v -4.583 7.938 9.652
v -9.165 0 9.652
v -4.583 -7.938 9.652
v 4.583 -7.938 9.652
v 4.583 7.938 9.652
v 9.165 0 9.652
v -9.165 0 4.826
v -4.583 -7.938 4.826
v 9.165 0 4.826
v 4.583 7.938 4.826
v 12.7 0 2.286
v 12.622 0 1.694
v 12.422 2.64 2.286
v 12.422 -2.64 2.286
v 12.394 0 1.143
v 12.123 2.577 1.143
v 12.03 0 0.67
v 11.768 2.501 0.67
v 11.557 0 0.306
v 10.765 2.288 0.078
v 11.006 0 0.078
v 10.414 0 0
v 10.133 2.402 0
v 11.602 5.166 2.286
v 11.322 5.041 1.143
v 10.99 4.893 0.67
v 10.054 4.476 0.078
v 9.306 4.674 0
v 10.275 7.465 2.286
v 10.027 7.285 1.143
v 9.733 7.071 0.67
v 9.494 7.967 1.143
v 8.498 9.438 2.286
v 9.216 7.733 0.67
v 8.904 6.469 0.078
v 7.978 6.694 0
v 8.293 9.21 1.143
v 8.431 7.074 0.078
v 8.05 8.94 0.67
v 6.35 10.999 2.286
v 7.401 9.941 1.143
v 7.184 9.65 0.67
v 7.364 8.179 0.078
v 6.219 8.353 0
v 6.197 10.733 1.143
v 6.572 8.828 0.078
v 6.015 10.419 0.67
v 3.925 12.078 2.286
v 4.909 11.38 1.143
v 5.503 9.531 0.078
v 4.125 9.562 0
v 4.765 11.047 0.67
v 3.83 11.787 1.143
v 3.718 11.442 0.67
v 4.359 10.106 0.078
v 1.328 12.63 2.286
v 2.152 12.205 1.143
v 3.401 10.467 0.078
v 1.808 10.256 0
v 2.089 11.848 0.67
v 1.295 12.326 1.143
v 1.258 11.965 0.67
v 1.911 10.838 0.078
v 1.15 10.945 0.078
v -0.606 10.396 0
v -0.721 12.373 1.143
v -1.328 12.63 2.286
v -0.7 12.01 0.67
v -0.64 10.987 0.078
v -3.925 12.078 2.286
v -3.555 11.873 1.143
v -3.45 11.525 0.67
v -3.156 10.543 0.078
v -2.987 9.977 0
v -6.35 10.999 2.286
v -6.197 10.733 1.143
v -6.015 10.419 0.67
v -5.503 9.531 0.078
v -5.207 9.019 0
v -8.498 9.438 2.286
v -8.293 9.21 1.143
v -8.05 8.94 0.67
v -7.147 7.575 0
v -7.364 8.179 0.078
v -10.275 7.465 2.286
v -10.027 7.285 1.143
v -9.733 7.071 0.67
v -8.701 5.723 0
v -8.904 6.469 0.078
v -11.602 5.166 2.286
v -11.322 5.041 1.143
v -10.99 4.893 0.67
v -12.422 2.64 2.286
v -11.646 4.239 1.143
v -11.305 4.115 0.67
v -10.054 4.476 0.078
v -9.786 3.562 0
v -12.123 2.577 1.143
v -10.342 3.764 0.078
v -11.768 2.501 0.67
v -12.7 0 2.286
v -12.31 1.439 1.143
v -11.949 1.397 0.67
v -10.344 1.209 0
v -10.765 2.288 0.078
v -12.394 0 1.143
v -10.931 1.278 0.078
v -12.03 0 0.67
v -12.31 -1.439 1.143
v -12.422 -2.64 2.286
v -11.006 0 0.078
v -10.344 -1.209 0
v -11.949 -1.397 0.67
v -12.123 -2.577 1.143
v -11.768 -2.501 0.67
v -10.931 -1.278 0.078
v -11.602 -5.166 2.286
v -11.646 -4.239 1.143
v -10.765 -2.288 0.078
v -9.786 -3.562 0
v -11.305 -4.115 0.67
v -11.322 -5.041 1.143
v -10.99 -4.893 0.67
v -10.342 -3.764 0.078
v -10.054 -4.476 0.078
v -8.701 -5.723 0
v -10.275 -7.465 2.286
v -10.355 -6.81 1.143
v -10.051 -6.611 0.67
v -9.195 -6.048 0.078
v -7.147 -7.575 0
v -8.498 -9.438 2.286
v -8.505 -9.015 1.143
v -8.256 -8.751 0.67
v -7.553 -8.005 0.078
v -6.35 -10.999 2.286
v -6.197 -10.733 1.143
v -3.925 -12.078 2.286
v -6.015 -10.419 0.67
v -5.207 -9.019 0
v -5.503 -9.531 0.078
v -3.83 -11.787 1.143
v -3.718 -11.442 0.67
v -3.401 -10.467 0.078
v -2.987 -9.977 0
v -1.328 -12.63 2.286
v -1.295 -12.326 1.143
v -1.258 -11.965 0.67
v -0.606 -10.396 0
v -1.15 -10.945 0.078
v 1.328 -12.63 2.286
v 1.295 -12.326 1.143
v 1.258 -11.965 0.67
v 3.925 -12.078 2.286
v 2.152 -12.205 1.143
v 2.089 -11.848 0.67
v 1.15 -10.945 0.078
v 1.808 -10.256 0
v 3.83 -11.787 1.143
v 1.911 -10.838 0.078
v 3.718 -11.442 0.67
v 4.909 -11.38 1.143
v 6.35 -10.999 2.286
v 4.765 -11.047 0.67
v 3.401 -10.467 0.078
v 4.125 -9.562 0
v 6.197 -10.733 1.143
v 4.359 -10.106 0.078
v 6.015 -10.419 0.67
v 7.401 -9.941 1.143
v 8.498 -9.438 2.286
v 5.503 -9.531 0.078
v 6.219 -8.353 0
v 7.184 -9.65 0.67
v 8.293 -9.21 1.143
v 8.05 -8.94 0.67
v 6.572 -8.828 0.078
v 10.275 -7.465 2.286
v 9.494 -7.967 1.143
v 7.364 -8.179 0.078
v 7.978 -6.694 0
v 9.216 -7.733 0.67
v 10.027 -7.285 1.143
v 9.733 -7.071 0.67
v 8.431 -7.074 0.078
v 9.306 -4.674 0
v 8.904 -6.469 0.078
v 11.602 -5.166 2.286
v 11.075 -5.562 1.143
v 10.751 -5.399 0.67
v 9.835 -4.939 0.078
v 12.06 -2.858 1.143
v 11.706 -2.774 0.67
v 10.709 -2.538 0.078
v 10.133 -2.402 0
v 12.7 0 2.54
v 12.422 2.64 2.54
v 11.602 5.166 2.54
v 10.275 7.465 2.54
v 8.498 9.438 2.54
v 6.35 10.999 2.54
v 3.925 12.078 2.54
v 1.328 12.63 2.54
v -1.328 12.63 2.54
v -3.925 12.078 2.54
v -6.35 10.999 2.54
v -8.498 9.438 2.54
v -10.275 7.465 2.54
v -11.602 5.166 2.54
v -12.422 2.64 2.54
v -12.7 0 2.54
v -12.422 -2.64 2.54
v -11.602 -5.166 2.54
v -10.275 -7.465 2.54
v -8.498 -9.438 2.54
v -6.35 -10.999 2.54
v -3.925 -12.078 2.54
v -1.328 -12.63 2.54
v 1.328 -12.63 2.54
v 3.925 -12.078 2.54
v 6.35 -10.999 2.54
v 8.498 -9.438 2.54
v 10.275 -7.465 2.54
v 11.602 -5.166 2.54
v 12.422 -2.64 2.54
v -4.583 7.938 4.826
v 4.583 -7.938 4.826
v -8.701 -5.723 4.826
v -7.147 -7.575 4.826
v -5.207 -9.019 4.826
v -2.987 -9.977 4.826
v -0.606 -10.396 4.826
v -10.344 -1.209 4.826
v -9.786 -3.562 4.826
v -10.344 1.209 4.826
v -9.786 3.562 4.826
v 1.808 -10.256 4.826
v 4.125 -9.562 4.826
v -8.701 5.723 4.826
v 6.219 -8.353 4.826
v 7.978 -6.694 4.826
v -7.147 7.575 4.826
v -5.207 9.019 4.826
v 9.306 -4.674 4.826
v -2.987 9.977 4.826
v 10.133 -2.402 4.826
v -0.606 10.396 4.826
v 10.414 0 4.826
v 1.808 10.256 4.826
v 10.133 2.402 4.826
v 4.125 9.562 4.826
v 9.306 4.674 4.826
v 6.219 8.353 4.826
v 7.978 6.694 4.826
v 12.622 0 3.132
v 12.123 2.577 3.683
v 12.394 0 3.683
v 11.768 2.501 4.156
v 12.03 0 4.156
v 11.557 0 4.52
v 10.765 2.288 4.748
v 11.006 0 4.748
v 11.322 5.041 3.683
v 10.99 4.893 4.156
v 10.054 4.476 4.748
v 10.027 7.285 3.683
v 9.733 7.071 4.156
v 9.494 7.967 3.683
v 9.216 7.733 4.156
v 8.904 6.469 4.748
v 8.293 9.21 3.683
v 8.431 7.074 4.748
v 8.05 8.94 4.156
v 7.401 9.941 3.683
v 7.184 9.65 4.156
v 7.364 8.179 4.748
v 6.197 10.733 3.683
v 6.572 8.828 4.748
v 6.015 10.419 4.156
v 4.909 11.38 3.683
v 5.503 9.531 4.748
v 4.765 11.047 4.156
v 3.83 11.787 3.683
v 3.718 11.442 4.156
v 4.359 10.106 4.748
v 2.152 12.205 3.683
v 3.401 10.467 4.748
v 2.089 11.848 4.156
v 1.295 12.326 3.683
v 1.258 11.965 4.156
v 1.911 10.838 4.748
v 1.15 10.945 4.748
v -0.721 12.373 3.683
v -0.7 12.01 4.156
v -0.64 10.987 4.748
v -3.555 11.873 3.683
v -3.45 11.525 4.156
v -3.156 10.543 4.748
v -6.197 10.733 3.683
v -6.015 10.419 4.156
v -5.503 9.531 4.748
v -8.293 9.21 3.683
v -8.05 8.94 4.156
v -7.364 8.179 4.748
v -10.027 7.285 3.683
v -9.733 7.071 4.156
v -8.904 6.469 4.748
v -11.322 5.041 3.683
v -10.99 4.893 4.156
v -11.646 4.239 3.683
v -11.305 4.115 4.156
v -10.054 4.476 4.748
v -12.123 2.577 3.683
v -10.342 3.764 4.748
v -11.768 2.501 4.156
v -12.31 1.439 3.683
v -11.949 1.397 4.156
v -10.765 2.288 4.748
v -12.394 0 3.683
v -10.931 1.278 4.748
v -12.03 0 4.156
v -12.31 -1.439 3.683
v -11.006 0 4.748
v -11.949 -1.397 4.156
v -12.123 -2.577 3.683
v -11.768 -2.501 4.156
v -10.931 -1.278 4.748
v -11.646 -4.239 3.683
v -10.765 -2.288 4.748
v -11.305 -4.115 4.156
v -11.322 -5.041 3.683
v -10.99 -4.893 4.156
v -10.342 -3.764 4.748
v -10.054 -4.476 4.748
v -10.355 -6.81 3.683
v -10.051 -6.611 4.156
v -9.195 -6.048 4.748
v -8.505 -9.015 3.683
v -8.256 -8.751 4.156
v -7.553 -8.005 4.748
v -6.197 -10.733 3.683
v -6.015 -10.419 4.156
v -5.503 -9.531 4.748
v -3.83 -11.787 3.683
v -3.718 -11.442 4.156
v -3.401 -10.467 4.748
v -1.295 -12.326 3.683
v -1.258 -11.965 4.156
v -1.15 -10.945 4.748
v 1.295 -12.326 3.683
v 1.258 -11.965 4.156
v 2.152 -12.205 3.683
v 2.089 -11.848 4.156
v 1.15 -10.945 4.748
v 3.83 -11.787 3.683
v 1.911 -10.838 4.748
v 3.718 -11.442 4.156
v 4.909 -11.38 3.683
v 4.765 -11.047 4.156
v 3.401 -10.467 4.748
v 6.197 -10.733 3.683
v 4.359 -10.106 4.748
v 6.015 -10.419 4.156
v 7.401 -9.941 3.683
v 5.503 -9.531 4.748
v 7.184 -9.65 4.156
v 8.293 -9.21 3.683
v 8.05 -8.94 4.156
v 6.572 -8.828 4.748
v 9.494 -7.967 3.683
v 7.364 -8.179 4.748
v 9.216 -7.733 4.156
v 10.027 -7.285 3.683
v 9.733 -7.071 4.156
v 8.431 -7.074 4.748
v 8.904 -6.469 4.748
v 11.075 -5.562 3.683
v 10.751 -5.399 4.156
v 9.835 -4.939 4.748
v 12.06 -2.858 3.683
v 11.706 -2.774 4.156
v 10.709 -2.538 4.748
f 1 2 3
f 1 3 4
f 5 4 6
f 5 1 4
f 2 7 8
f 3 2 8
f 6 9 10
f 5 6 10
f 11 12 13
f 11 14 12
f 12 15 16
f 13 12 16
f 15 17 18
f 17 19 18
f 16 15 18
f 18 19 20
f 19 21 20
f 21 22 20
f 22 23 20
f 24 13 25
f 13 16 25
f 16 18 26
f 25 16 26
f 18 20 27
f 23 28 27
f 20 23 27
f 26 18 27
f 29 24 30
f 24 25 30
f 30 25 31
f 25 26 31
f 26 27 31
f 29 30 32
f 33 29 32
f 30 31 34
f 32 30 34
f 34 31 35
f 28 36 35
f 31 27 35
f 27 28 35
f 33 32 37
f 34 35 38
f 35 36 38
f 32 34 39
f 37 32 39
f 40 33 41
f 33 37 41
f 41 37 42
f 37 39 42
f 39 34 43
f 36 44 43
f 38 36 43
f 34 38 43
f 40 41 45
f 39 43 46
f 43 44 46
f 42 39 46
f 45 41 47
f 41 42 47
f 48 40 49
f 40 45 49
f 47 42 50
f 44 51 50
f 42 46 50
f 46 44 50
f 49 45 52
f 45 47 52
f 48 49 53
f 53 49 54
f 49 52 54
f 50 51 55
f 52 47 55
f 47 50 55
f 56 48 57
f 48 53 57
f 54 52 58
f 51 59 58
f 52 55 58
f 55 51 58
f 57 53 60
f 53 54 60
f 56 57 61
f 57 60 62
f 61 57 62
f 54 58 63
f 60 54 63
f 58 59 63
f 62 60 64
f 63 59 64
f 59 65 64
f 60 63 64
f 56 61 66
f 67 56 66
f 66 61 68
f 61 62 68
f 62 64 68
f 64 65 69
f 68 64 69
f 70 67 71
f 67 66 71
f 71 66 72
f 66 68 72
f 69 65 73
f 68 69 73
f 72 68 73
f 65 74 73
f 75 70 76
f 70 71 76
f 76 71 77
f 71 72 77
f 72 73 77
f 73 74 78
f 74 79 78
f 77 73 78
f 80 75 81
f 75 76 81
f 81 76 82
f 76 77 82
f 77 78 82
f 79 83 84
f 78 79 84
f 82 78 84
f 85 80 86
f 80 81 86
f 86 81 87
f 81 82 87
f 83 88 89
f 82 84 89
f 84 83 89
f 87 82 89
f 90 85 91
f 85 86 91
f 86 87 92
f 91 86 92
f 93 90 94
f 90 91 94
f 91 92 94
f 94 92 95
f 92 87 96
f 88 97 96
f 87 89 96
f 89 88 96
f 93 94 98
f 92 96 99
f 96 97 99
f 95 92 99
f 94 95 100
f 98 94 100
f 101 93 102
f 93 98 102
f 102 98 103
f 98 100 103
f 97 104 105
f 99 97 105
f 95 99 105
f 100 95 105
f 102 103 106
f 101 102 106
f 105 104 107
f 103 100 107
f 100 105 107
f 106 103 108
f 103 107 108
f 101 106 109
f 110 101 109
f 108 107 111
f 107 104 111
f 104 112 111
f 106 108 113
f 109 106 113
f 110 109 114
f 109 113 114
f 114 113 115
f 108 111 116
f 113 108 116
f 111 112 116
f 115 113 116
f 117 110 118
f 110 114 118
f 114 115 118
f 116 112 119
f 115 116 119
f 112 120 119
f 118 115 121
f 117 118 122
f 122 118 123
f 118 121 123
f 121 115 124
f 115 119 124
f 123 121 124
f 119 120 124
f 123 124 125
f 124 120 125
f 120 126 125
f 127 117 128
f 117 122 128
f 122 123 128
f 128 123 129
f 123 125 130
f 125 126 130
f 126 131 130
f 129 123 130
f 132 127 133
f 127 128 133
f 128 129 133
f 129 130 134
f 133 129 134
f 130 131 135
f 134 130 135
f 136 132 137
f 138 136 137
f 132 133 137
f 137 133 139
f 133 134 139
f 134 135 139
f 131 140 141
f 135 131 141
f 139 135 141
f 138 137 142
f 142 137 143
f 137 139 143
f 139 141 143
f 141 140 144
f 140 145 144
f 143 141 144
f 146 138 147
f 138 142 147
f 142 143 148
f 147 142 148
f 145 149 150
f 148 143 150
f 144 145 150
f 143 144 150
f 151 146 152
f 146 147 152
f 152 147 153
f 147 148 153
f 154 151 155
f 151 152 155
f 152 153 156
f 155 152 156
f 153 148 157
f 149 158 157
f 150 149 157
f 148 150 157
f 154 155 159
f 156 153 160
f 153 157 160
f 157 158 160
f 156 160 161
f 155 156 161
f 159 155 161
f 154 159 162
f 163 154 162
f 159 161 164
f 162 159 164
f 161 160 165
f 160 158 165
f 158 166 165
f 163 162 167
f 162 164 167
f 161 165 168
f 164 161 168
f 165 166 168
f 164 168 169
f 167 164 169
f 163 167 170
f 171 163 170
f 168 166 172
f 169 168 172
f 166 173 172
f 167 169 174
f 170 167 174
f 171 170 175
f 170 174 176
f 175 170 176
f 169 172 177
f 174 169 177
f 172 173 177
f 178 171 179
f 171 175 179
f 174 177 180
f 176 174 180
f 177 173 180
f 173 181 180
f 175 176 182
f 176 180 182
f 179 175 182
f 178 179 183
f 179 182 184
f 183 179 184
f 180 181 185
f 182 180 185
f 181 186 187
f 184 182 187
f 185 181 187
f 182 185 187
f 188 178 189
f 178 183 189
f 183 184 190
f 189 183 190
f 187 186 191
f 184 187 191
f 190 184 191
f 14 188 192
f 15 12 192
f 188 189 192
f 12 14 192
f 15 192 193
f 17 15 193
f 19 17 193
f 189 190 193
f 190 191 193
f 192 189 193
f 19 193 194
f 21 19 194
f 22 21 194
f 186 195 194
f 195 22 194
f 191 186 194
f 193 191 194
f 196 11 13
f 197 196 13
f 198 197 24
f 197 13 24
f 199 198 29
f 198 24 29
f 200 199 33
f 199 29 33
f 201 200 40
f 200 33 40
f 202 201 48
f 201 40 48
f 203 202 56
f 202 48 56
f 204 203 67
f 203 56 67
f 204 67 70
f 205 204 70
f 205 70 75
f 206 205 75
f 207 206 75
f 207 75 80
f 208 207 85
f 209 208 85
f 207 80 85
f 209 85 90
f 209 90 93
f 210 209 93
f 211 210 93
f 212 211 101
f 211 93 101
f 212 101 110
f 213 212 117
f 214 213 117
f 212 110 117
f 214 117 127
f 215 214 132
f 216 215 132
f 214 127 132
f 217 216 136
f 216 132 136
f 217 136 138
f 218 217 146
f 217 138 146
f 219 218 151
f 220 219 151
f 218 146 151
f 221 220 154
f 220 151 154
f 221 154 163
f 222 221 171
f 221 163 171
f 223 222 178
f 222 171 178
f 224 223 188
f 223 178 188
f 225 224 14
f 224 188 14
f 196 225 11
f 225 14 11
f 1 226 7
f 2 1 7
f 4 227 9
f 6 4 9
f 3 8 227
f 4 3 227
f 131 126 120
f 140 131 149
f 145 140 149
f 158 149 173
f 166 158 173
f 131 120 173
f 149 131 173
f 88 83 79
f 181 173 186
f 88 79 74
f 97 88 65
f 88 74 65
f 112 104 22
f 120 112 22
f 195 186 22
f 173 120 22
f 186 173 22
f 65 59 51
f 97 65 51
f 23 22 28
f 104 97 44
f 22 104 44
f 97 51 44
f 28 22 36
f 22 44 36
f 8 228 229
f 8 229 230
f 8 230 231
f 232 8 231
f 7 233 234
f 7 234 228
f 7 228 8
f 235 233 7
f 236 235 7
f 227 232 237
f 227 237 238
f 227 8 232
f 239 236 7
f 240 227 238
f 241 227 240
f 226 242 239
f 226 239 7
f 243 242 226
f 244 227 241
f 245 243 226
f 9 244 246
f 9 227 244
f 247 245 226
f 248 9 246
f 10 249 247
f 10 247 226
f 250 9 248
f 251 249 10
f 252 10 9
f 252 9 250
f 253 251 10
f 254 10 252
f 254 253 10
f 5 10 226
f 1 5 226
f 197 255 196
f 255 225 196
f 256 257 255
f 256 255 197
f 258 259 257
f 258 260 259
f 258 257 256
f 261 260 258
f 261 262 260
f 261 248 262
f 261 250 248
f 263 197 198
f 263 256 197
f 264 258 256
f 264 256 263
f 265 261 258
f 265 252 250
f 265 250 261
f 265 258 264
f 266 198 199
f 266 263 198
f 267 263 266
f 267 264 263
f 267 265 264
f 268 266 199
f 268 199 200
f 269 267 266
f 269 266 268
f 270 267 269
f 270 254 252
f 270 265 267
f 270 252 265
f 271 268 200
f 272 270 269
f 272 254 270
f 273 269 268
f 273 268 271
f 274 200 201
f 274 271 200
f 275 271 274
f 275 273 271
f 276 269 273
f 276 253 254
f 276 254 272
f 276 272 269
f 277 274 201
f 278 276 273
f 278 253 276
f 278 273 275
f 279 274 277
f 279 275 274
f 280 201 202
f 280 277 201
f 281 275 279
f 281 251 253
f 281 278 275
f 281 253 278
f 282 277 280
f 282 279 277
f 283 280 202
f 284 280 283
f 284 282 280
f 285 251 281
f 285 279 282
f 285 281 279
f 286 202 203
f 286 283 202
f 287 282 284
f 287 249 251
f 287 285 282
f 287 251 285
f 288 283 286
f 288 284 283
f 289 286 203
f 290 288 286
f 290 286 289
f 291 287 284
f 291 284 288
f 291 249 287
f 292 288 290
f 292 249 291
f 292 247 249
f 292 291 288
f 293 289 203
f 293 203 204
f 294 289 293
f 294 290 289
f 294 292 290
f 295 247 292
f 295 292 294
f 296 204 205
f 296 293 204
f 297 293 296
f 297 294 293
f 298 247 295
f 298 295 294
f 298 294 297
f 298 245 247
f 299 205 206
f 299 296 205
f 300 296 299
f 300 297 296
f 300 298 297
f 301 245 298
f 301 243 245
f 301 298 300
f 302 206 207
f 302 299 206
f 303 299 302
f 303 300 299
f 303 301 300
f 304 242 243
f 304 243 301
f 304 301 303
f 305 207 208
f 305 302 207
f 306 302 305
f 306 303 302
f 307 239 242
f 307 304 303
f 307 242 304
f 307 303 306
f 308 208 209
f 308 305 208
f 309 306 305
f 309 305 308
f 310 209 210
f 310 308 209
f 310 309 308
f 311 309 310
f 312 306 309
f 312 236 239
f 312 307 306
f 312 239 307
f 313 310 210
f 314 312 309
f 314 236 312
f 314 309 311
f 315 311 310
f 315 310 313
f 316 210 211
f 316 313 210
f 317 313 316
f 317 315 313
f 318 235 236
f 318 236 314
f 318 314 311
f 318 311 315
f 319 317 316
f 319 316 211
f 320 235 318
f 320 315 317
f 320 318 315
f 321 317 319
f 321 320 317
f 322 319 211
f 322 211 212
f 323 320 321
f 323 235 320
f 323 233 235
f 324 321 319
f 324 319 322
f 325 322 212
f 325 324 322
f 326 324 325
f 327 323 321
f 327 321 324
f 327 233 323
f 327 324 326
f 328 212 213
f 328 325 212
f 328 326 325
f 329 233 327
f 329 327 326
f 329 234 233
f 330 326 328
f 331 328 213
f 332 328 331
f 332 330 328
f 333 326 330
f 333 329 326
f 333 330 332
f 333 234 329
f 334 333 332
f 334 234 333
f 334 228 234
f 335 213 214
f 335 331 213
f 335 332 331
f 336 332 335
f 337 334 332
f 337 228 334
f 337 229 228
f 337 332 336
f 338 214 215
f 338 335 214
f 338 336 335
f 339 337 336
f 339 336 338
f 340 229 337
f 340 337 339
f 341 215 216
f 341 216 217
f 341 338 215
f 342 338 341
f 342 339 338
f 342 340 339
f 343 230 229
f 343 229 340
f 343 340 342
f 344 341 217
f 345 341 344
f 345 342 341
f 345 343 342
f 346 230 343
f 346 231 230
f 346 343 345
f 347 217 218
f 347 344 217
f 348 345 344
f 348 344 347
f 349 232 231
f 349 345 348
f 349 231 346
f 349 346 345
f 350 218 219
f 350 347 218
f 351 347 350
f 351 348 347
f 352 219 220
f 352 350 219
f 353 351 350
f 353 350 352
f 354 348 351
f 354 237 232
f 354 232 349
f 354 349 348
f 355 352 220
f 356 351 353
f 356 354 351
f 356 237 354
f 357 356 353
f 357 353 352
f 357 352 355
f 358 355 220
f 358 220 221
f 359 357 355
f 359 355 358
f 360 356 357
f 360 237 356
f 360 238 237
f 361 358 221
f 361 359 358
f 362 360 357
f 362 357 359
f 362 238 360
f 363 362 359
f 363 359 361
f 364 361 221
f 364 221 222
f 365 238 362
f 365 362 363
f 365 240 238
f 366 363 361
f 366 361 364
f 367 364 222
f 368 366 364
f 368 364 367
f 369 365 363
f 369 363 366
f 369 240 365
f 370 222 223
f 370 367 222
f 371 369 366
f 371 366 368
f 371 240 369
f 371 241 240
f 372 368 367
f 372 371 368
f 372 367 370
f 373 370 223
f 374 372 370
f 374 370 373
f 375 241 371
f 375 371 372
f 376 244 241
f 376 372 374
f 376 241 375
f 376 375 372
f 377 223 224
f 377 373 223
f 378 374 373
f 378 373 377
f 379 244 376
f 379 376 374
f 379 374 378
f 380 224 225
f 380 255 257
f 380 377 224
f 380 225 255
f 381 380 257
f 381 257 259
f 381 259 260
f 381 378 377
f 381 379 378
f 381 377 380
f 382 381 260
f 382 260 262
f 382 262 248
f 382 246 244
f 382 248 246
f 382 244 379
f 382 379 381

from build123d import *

# Parameters (mm, degrees)
F0_R     = 12.7
F1_DEPTH = 4.826
F3_DEPTH = 4.826
F4_R     = 2.286
F5_R     = 2.286


with BuildPart() as f1:
    # F0 (on Top) → F1 (new body)
    with BuildSketch(Plane.XY):
        Circle(F0_R)
    extrude(amount=F1_DEPTH)

    # F2 (on face) → F3 (join)
    with BuildSketch(Plane.XY.offset(4.826)):
        Polygon((4.582718, 7.9375), (-4.582718, 7.9375), (-9.165436, 0), (-4.582718, -7.9375), (4.582718, -7.9375), (9.165436, 0), align=None)
    extrude(amount=F3_DEPTH)

    # F4
    f4_edges = [f1.edges().sort_by_distance(p)[0] for p in [
        (-12.7, 0, 4.826),
    ]]
    fillet(f4_edges, radius=F4_R)

    # F5
    f5_edges = [f1.edges().sort_by_distance(p)[0] for p in [
        (-12.7, 0, 0),
    ]]
    fillet(f5_edges, radius=F5_R)


solid = f1.part
